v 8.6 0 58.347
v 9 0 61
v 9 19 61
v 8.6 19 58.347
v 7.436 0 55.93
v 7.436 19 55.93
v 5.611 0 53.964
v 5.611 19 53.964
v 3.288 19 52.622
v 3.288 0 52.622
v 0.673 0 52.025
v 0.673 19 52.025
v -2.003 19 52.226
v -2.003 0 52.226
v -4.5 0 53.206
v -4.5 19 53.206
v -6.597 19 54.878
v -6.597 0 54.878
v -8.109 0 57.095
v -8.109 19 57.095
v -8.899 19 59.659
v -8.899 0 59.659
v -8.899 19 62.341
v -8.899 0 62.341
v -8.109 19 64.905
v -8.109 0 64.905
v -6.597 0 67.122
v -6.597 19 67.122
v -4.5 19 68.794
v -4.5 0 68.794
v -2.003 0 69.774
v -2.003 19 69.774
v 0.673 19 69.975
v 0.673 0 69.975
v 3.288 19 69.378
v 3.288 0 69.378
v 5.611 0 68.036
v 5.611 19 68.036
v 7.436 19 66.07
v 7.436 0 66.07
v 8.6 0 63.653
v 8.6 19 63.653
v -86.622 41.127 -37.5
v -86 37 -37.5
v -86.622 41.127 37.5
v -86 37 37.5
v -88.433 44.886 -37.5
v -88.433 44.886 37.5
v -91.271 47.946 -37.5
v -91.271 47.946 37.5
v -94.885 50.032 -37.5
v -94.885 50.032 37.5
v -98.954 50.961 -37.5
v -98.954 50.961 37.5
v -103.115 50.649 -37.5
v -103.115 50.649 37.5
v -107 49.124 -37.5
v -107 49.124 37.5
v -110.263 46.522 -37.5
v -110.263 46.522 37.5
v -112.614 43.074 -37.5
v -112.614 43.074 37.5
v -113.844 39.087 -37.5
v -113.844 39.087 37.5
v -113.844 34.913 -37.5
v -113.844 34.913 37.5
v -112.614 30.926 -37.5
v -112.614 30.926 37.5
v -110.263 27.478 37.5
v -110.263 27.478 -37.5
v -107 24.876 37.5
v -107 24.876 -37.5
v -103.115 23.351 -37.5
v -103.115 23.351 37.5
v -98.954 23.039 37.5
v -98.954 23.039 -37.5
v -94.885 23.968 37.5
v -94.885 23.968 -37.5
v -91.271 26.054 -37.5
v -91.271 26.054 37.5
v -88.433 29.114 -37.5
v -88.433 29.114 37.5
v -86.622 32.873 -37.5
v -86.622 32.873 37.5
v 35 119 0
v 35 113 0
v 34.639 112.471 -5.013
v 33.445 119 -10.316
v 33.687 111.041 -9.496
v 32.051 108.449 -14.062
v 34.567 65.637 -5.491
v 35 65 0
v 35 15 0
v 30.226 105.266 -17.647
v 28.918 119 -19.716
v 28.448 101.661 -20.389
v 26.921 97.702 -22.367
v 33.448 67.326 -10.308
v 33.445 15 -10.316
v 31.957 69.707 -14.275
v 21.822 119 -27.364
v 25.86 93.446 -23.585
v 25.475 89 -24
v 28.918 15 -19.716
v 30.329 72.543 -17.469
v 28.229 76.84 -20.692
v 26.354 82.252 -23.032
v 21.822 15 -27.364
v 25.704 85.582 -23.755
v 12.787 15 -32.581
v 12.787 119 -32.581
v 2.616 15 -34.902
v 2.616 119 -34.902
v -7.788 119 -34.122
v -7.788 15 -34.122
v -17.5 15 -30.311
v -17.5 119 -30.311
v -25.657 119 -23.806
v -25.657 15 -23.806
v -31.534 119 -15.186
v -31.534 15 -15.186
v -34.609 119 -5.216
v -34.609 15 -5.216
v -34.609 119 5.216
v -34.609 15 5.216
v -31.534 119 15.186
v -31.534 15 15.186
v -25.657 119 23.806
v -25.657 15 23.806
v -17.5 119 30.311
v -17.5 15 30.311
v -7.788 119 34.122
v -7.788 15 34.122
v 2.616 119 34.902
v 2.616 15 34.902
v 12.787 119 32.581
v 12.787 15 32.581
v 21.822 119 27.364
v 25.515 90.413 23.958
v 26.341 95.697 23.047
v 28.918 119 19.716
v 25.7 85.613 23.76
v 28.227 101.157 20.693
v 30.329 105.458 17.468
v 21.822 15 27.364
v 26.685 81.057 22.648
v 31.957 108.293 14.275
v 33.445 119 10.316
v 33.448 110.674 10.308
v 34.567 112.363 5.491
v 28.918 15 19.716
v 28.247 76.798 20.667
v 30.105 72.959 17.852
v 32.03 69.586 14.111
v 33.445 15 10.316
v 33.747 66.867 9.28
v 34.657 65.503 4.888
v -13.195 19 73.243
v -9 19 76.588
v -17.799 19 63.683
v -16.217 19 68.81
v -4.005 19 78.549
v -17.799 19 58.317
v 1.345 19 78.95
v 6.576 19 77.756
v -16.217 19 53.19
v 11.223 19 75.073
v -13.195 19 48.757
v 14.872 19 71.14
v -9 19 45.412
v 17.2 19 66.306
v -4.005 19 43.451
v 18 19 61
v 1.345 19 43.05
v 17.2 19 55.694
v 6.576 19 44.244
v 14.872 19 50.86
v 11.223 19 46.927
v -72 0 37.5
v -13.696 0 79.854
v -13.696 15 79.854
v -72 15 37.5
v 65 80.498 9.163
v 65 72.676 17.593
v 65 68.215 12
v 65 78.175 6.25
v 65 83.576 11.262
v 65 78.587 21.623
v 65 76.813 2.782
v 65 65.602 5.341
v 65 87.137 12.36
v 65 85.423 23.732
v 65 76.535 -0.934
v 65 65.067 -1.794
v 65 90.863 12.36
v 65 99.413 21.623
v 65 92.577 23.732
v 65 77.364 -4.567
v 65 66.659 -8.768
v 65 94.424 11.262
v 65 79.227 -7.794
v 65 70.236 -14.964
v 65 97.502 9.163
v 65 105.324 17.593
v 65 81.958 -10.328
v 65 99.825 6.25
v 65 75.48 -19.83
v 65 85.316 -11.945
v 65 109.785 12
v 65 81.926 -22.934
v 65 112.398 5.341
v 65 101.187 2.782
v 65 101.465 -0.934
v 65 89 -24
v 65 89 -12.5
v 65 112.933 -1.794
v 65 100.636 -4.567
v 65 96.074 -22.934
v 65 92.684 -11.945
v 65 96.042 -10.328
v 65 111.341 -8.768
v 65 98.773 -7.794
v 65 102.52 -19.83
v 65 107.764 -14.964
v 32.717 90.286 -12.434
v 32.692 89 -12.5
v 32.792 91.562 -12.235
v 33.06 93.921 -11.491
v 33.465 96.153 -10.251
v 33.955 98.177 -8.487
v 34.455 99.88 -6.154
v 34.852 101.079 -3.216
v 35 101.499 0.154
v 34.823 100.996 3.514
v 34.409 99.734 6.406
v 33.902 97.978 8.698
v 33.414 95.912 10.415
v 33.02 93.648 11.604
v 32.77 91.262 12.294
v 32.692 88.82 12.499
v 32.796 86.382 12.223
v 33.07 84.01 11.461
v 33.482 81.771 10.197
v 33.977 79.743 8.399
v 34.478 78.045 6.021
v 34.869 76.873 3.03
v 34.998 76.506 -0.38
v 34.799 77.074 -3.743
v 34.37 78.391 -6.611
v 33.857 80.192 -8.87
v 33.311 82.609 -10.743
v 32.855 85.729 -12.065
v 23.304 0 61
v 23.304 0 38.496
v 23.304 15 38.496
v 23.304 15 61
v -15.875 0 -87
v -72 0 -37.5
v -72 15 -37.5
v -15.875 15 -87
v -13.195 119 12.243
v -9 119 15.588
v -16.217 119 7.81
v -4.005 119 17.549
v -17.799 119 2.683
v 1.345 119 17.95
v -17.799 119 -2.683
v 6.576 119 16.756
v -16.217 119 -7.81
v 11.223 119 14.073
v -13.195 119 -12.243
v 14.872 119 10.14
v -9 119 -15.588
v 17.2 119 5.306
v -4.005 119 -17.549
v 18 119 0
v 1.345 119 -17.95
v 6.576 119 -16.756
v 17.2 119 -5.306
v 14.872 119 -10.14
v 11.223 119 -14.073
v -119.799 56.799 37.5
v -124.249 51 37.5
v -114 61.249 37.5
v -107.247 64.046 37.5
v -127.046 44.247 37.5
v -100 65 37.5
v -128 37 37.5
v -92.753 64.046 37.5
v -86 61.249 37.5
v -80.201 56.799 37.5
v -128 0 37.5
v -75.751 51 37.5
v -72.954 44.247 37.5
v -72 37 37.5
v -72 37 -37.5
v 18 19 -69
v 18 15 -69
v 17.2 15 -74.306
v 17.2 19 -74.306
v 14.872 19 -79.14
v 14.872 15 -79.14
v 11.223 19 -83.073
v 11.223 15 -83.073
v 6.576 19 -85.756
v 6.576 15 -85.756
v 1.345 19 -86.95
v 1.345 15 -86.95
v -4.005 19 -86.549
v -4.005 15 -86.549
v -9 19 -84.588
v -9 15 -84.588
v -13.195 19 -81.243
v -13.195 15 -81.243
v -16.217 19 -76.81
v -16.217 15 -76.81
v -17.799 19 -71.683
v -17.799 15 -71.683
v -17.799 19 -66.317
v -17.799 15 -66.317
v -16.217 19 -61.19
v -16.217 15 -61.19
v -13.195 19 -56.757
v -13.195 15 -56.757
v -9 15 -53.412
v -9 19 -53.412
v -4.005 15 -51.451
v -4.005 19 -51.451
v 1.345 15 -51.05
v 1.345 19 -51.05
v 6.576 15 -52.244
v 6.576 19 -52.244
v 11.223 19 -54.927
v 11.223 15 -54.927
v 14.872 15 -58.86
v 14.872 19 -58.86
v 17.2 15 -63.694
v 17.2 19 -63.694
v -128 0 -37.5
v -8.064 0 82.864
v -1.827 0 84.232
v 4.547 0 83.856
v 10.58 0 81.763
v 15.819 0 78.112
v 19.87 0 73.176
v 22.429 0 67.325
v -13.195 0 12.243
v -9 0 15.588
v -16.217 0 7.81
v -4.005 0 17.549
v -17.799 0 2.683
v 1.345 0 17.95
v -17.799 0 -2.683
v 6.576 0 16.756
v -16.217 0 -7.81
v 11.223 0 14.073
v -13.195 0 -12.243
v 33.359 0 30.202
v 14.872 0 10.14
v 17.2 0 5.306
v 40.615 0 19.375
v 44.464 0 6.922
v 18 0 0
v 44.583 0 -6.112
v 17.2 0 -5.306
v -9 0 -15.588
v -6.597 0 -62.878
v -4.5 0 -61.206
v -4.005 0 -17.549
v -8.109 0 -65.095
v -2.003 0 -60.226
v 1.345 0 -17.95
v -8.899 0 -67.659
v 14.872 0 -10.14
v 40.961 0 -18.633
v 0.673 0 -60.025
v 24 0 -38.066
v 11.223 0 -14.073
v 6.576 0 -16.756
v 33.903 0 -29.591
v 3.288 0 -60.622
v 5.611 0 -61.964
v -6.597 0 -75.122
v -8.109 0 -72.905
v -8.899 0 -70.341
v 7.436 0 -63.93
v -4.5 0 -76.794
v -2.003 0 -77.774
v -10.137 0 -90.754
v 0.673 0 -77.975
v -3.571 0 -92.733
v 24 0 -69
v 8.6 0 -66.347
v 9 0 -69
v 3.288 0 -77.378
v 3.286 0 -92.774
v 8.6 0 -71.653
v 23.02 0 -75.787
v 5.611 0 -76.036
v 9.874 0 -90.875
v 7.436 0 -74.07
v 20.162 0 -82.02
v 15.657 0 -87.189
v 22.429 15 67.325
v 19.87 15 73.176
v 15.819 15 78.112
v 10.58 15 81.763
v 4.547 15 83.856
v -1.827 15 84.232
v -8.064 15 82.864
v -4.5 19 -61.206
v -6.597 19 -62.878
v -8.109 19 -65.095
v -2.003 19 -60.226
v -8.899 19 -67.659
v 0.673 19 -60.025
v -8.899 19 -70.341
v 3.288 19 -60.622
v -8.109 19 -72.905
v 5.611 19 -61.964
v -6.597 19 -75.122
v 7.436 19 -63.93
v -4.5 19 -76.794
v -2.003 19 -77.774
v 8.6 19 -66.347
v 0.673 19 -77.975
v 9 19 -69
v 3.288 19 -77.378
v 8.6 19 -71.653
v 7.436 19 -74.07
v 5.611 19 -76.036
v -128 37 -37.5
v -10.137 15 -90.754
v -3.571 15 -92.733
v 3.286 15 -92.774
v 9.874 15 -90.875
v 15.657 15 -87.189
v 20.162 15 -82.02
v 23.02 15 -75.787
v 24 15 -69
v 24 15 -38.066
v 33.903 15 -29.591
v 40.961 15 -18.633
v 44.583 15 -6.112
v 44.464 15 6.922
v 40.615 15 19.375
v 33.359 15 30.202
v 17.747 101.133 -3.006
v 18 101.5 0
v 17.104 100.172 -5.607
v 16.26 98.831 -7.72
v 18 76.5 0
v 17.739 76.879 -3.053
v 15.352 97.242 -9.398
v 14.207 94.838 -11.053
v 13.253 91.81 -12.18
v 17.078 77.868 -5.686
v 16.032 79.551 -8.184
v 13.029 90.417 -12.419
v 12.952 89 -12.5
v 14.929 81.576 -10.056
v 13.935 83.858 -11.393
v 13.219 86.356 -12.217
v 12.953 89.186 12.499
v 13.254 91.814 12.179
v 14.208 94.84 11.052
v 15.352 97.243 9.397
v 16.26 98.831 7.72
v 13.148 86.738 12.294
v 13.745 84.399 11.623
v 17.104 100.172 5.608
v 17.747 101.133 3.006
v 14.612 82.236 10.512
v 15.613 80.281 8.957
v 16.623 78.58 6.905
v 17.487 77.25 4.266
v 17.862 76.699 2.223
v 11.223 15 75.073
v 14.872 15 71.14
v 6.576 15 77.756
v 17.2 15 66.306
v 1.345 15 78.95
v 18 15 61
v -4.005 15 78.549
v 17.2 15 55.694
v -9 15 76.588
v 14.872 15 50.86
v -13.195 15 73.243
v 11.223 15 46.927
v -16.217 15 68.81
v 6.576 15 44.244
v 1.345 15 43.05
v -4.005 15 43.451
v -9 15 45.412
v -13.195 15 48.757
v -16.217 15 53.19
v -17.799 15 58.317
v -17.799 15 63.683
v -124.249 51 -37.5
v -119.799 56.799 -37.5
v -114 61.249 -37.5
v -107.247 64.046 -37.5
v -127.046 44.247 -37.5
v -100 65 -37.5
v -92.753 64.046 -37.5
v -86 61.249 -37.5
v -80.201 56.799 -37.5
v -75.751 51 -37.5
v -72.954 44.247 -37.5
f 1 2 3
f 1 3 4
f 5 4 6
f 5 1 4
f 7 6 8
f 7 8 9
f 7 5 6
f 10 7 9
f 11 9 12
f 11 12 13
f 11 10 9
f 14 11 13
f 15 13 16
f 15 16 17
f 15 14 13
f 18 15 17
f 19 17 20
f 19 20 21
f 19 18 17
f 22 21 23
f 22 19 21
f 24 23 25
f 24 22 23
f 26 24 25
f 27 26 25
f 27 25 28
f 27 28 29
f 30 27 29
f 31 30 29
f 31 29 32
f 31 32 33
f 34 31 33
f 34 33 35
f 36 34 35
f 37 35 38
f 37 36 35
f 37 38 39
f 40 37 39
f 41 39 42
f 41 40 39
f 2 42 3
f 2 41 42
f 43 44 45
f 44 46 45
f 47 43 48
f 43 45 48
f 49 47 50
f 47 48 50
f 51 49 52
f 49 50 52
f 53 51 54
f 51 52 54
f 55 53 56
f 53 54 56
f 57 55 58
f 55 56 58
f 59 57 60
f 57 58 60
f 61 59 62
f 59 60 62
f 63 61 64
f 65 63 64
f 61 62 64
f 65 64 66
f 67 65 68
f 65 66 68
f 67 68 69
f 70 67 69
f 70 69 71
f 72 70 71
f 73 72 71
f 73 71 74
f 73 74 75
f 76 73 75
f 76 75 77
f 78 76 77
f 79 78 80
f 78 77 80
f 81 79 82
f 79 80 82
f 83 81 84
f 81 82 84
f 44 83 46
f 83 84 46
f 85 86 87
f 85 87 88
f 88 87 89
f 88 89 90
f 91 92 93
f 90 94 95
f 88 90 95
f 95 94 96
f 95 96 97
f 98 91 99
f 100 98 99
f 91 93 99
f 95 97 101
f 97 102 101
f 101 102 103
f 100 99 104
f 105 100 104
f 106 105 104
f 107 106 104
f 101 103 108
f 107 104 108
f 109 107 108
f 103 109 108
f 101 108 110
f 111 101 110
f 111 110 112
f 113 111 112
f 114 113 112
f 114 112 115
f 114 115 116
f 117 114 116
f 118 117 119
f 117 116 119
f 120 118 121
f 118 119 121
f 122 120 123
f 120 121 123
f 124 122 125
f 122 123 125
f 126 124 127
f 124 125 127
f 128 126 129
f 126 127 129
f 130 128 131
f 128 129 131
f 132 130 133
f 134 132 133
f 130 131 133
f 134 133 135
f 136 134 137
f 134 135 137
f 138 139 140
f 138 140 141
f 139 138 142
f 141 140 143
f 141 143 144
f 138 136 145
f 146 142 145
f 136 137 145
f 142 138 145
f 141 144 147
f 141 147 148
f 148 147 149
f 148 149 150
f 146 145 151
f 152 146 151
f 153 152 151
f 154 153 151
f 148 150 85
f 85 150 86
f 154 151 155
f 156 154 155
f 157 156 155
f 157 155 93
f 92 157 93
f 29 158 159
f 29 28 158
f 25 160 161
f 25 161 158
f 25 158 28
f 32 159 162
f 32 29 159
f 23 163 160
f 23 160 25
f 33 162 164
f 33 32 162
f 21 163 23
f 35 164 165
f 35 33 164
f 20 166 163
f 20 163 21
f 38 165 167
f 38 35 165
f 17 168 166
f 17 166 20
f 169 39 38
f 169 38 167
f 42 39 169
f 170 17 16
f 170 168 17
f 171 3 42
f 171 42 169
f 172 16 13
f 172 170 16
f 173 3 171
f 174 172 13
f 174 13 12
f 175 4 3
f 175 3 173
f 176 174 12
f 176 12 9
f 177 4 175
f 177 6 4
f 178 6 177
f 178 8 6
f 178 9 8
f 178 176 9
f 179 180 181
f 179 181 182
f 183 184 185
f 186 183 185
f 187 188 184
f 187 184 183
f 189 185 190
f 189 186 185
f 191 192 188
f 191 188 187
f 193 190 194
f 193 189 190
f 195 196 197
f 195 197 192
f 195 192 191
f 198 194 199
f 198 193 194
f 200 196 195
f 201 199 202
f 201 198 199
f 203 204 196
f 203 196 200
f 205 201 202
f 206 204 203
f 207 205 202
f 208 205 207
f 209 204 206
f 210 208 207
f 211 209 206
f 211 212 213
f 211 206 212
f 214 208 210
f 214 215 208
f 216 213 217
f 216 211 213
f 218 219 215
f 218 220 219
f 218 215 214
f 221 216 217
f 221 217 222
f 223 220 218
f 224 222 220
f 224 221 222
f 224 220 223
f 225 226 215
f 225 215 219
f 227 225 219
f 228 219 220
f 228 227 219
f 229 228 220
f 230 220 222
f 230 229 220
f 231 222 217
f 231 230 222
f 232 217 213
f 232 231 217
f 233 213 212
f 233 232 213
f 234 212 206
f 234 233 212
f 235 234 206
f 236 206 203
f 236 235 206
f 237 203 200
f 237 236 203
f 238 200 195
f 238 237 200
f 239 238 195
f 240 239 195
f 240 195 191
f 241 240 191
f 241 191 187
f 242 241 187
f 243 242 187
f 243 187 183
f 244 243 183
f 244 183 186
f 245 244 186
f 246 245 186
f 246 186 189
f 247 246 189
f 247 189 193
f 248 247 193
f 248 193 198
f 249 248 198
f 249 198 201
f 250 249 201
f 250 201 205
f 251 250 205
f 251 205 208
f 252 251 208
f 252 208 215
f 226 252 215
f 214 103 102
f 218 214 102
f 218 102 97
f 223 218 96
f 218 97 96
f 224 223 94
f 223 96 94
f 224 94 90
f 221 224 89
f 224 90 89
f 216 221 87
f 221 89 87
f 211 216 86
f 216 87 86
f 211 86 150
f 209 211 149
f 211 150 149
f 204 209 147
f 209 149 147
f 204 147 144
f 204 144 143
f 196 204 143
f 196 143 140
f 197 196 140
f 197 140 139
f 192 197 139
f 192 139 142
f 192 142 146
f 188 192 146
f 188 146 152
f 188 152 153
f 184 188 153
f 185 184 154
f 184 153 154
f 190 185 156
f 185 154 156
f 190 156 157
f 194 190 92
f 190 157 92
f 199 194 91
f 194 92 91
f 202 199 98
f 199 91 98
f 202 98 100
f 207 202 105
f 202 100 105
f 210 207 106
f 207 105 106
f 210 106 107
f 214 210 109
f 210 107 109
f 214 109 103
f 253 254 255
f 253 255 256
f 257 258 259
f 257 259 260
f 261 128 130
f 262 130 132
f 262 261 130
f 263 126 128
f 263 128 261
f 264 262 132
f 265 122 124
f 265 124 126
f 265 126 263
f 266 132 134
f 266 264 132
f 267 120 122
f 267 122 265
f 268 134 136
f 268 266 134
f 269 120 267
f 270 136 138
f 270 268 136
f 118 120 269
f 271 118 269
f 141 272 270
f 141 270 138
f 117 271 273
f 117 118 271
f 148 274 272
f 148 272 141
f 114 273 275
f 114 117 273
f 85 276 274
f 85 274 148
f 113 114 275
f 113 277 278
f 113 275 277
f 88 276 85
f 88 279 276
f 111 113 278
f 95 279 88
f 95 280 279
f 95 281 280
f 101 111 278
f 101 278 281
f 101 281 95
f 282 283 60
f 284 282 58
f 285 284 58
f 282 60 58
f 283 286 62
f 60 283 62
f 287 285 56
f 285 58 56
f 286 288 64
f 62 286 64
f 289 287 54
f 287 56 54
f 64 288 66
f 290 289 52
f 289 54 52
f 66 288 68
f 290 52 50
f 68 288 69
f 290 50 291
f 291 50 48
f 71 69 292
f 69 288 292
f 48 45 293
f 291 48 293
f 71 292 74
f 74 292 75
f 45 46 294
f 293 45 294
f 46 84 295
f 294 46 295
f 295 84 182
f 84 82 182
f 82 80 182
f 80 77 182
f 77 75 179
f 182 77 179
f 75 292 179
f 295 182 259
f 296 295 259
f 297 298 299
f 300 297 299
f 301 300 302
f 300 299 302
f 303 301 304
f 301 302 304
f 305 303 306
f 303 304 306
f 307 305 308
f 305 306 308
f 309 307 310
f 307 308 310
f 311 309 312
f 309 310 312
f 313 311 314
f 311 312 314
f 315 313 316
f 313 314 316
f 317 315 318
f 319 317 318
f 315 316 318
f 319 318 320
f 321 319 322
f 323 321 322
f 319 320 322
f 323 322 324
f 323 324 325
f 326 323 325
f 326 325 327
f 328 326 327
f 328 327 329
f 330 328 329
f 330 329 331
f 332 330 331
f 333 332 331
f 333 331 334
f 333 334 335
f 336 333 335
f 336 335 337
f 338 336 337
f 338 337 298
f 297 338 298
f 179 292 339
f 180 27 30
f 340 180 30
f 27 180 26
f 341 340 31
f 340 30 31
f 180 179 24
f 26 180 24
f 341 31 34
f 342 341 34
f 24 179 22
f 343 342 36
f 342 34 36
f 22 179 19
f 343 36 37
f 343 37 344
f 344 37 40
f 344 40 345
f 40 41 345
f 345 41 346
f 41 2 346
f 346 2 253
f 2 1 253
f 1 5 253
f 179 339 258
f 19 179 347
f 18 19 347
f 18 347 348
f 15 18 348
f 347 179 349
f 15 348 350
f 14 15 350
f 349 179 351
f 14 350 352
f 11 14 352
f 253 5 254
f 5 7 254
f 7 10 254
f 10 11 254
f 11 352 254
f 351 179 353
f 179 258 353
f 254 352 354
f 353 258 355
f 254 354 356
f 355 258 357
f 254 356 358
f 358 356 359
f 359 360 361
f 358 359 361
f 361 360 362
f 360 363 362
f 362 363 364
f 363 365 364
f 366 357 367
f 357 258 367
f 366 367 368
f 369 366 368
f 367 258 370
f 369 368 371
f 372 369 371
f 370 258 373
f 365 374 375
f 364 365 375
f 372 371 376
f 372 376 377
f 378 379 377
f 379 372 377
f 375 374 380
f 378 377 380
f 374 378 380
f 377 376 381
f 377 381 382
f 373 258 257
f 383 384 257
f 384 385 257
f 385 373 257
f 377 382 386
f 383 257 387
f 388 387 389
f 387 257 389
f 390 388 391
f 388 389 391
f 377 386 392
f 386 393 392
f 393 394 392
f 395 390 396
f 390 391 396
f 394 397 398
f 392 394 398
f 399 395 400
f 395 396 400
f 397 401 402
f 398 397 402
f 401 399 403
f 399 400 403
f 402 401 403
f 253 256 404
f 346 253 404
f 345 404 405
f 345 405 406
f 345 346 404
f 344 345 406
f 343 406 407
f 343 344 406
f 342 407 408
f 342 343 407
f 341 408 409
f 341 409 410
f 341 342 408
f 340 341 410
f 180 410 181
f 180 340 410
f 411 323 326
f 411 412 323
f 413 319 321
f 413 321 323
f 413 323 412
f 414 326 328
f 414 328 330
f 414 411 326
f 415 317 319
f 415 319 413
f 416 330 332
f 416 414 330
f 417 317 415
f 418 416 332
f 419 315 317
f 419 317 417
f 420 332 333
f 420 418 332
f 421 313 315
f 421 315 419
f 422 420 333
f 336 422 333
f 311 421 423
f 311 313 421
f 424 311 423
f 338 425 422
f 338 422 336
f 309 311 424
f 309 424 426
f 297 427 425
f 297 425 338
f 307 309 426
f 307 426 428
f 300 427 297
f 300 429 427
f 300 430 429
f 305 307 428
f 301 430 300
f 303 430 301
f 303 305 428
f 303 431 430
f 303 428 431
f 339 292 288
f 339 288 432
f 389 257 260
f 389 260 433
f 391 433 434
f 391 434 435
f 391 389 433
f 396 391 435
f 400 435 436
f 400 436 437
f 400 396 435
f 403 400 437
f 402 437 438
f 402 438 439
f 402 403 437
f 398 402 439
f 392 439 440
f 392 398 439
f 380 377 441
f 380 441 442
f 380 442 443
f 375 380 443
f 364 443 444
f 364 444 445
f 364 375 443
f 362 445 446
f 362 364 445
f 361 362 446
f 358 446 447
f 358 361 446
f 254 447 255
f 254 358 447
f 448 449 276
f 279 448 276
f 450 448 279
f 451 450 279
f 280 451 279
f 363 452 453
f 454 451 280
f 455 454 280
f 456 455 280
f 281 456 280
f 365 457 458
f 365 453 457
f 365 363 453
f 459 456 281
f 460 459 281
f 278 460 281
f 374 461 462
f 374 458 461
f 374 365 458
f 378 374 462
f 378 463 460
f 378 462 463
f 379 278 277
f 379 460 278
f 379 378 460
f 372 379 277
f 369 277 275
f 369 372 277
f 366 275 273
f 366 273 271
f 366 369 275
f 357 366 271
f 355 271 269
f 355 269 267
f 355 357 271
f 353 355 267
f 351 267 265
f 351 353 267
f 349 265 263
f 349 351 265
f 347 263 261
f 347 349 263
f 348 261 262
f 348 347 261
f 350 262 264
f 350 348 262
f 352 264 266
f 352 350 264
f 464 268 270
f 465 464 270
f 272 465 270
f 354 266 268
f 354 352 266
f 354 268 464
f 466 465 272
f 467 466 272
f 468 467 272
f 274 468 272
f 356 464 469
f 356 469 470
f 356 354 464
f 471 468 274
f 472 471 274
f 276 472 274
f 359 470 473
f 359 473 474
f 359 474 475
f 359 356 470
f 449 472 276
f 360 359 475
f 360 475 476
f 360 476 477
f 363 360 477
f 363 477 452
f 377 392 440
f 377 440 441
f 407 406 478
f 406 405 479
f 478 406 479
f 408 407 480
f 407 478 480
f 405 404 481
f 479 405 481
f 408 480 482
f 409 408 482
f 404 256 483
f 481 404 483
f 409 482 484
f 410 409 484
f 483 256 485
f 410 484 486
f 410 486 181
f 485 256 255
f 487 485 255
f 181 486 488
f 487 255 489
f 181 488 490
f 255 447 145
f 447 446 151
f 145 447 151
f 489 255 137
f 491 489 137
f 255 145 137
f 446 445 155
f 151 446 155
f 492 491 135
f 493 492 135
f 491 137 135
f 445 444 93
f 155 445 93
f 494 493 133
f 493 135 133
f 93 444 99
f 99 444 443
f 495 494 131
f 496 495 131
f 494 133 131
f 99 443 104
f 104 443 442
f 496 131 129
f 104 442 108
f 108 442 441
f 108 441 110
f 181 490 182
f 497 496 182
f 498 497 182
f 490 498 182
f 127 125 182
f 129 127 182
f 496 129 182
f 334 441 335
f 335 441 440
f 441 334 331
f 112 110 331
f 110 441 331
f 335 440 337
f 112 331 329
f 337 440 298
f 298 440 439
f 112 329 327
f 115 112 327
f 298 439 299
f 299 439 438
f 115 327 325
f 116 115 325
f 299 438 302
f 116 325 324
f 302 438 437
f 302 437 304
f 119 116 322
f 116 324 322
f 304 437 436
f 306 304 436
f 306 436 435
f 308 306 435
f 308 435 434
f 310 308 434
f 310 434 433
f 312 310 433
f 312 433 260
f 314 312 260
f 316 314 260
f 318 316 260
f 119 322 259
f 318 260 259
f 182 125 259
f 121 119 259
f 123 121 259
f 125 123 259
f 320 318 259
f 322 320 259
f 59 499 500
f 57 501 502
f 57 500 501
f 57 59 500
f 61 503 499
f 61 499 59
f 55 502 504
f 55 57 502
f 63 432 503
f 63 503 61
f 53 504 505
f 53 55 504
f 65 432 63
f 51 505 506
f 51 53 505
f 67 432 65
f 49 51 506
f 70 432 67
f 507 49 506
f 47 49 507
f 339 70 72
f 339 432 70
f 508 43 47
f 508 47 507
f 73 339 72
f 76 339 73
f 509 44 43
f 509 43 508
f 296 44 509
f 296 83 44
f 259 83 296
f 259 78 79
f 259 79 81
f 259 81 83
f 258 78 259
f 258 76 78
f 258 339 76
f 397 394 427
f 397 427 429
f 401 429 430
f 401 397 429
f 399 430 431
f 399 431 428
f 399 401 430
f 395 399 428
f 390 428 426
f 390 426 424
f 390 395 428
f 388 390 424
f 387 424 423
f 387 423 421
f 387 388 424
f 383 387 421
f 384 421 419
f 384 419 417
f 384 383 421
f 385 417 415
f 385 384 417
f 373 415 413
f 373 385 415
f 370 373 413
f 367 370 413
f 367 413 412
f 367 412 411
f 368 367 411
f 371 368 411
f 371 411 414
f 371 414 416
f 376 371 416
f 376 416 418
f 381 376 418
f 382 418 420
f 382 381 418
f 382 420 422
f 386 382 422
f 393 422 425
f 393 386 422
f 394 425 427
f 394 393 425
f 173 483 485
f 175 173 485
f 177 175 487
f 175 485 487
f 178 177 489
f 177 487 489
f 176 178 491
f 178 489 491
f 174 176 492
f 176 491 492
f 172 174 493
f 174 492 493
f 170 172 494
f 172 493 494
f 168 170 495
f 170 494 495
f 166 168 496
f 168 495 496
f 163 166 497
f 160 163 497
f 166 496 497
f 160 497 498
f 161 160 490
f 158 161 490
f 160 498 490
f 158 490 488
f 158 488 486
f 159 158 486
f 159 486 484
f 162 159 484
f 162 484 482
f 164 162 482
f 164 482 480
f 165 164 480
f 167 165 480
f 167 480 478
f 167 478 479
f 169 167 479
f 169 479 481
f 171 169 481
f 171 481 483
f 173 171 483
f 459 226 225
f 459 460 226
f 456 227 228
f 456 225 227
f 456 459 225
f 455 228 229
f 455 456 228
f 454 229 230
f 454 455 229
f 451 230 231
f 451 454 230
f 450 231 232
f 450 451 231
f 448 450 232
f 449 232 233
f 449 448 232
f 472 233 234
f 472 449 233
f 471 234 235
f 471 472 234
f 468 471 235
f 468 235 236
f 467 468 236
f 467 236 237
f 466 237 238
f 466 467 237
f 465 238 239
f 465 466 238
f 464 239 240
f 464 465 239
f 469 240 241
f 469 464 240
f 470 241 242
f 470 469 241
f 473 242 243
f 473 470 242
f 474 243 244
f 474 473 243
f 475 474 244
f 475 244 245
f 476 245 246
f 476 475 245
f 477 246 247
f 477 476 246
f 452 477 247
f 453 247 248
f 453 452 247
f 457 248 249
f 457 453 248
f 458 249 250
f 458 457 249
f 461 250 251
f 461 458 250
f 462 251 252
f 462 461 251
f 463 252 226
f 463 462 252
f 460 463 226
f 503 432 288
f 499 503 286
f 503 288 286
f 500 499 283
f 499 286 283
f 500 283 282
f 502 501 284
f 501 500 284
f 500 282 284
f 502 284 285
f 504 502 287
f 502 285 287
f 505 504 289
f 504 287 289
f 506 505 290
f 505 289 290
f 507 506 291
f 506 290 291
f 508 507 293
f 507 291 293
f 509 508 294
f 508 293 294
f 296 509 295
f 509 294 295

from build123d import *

# Parameters (mm, degrees)
SKETCH1_R               = 18
SKETCH1_R_2             = 35
BOSS_EXTRUDE1_DEPTH     = 15
SKETCH1_3_R             = 35
SKETCH1_3_R_2           = 18
BOSS_EXTRUDE2_DEPTH     = 119
SKETCH1_4_R             = 18
SKETCH1_4_R_2           = 9
BOSS_EXTRUDE3_DEPTH     = 19
SKETCH1_5_W             = 56
SKETCH1_5_H             = 75
BOSS_EXTRUDE4_DEPTH     = 65
CUT_EXTRUDE1_DEPTH      = 198.974745864
CUT_EXTRUDE1_DEPTH_BACK = 65
SKETCH2_R               = 14
SKETCH3_R               = 24
SKETCH3_R_2             = 12.5
BOSS_EXTRUDE5_DEPTH     = 65
SKETCH1_6_R             = 18
CUT_EXTRUDE3_DEPTH      = 263
SKETCH3_3_R             = 12.5
CUT_EXTRUDE4_DEPTH      = 263


with BuildPart() as part:
    # Sketch1 → Boss-Extrude1 (new body)
    with BuildSketch(Plane(origin=(0, 0, 0), x_dir=(1, 0, 0), z_dir=(0, 1, 0))):
        with BuildLine():
            ThreePointArc((23.30367726, -38.495955971), (44.998138968, -0.409254655), (24, 38.065732621))
            Line((24, 38.065732621), (24, 69))
            ThreePointArc((24, 69), (9.874292088, 90.874605271), (-15.87486298, 86.999686813))
            Line((-15.87486298, 86.999686813), (-72, 37.5))
            Line((-72, 37.5), (-72, -37.5))
            Line((-72, -37.5), (-13.696259751, -79.854013967))
            ThreePointArc((-13.696259751, -79.854013967), (10.58036287, -81.76336426), (23.30367726, -61))
            Line((23.30367726, -61), (23.30367726, -38.495955971))
        make_face()
        with Locations((0, -61)):
            Circle(SKETCH1_R, mode=Mode.SUBTRACT)
        Circle(SKETCH1_R_2, mode=Mode.SUBTRACT)
        with Locations((0, 69)):
            Circle(SKETCH1_R, mode=Mode.SUBTRACT)
    extrude(amount=BOSS_EXTRUDE1_DEPTH)

    # Sketch1<3> → Boss-Extrude2 (add)
    with BuildSketch(Plane(origin=(0, 0, 0), x_dir=(1, 0, 0), z_dir=(0, 1, 0))):
        Circle(SKETCH1_3_R)
        Circle(SKETCH1_3_R_2, mode=Mode.SUBTRACT)
    extrude(amount=BOSS_EXTRUDE2_DEPTH)

    # Sketch1<4> → Boss-Extrude3 (add)
    # profile 1 of 2: a face of its own
    with BuildSketch(Plane(origin=(0, 0, 0), x_dir=(1, 0, 0), z_dir=(0, 1, 0))):
        with Locations((0, 69)):
            Circle(SKETCH1_4_R)
        with Locations((0, 69)):
            Circle(SKETCH1_4_R_2, mode=Mode.SUBTRACT)
    # profile 2 of 2: a face of its own
    with BuildSketch(Plane(origin=(0, 0, 0), x_dir=(1, 0, 0), z_dir=(0, 1, 0))):
        with Locations((0, -61)):
            Circle(SKETCH1_4_R)
        with Locations((0, -61)):
            Circle(SKETCH1_4_R_2, mode=Mode.SUBTRACT)
    extrude(amount=BOSS_EXTRUDE3_DEPTH)

    # Sketch1<5> → Boss-Extrude4 (add)
    with BuildSketch(Plane(origin=(0, 0, 0), x_dir=(1, 0, 0), z_dir=(0, 1, 0))):
        with Locations((-100, 0)):
            Rectangle(SKETCH1_5_W, SKETCH1_5_H)
    extrude(amount=BOSS_EXTRUDE4_DEPTH)

    # Sketch2 → Cut-Extrude1 (cut, two sides: drawn at the far end of the back side and taken through both)
    with BuildSketch(Plane.XY.offset(-CUT_EXTRUDE1_DEPTH_BACK)):
        with BuildLine():
            Line((-128, 65), (-128, 37))
            ThreePointArc((-128, 37), (-119.798989873, 56.798989873), (-100, 65))
            Line((-100, 65), (-128, 65))
        make_face()
        with Locations((-100, 37)):
            Circle(SKETCH2_R)
        with BuildLine():
            Line((-72, 65), (-100, 65))
            ThreePointArc((-100, 65), (-80.201010127, 56.798989873), (-72, 37))
            Line((-72, 37), (-72, 65))
        make_face()
    extrude(amount=CUT_EXTRUDE1_DEPTH + CUT_EXTRUDE1_DEPTH_BACK, mode=Mode.SUBTRACT)

    # Sketch3 → Boss-Extrude5 (add)
    with BuildSketch(Plane(origin=(0, 0, 0), x_dir=(0, 0, -1), z_dir=(1, 0, 0))):
        with Locations((0, 89)):
            Circle(SKETCH3_R)
        with Locations((0, 89)):
            Circle(SKETCH3_R_2, mode=Mode.SUBTRACT)
    extrude(amount=BOSS_EXTRUDE5_DEPTH)

    # Sketch1<6> → Cut-Extrude3 (cut)
    with BuildSketch(Plane(origin=(0, 0, 0), x_dir=(1, 0, 0), z_dir=(0, 1, 0))):
        Circle(SKETCH1_6_R)
    extrude(amount=CUT_EXTRUDE3_DEPTH, mode=Mode.SUBTRACT)

    # Sketch3<3> → Cut-Extrude4 (cut)
    with BuildSketch(Plane(origin=(0, 0, 0), x_dir=(0, 0, -1), z_dir=(1, 0, 0))):
        with Locations((0, 89)):
            Circle(SKETCH3_3_R)
    extrude(amount=CUT_EXTRUDE4_DEPTH, mode=Mode.SUBTRACT)


solid = part.part
